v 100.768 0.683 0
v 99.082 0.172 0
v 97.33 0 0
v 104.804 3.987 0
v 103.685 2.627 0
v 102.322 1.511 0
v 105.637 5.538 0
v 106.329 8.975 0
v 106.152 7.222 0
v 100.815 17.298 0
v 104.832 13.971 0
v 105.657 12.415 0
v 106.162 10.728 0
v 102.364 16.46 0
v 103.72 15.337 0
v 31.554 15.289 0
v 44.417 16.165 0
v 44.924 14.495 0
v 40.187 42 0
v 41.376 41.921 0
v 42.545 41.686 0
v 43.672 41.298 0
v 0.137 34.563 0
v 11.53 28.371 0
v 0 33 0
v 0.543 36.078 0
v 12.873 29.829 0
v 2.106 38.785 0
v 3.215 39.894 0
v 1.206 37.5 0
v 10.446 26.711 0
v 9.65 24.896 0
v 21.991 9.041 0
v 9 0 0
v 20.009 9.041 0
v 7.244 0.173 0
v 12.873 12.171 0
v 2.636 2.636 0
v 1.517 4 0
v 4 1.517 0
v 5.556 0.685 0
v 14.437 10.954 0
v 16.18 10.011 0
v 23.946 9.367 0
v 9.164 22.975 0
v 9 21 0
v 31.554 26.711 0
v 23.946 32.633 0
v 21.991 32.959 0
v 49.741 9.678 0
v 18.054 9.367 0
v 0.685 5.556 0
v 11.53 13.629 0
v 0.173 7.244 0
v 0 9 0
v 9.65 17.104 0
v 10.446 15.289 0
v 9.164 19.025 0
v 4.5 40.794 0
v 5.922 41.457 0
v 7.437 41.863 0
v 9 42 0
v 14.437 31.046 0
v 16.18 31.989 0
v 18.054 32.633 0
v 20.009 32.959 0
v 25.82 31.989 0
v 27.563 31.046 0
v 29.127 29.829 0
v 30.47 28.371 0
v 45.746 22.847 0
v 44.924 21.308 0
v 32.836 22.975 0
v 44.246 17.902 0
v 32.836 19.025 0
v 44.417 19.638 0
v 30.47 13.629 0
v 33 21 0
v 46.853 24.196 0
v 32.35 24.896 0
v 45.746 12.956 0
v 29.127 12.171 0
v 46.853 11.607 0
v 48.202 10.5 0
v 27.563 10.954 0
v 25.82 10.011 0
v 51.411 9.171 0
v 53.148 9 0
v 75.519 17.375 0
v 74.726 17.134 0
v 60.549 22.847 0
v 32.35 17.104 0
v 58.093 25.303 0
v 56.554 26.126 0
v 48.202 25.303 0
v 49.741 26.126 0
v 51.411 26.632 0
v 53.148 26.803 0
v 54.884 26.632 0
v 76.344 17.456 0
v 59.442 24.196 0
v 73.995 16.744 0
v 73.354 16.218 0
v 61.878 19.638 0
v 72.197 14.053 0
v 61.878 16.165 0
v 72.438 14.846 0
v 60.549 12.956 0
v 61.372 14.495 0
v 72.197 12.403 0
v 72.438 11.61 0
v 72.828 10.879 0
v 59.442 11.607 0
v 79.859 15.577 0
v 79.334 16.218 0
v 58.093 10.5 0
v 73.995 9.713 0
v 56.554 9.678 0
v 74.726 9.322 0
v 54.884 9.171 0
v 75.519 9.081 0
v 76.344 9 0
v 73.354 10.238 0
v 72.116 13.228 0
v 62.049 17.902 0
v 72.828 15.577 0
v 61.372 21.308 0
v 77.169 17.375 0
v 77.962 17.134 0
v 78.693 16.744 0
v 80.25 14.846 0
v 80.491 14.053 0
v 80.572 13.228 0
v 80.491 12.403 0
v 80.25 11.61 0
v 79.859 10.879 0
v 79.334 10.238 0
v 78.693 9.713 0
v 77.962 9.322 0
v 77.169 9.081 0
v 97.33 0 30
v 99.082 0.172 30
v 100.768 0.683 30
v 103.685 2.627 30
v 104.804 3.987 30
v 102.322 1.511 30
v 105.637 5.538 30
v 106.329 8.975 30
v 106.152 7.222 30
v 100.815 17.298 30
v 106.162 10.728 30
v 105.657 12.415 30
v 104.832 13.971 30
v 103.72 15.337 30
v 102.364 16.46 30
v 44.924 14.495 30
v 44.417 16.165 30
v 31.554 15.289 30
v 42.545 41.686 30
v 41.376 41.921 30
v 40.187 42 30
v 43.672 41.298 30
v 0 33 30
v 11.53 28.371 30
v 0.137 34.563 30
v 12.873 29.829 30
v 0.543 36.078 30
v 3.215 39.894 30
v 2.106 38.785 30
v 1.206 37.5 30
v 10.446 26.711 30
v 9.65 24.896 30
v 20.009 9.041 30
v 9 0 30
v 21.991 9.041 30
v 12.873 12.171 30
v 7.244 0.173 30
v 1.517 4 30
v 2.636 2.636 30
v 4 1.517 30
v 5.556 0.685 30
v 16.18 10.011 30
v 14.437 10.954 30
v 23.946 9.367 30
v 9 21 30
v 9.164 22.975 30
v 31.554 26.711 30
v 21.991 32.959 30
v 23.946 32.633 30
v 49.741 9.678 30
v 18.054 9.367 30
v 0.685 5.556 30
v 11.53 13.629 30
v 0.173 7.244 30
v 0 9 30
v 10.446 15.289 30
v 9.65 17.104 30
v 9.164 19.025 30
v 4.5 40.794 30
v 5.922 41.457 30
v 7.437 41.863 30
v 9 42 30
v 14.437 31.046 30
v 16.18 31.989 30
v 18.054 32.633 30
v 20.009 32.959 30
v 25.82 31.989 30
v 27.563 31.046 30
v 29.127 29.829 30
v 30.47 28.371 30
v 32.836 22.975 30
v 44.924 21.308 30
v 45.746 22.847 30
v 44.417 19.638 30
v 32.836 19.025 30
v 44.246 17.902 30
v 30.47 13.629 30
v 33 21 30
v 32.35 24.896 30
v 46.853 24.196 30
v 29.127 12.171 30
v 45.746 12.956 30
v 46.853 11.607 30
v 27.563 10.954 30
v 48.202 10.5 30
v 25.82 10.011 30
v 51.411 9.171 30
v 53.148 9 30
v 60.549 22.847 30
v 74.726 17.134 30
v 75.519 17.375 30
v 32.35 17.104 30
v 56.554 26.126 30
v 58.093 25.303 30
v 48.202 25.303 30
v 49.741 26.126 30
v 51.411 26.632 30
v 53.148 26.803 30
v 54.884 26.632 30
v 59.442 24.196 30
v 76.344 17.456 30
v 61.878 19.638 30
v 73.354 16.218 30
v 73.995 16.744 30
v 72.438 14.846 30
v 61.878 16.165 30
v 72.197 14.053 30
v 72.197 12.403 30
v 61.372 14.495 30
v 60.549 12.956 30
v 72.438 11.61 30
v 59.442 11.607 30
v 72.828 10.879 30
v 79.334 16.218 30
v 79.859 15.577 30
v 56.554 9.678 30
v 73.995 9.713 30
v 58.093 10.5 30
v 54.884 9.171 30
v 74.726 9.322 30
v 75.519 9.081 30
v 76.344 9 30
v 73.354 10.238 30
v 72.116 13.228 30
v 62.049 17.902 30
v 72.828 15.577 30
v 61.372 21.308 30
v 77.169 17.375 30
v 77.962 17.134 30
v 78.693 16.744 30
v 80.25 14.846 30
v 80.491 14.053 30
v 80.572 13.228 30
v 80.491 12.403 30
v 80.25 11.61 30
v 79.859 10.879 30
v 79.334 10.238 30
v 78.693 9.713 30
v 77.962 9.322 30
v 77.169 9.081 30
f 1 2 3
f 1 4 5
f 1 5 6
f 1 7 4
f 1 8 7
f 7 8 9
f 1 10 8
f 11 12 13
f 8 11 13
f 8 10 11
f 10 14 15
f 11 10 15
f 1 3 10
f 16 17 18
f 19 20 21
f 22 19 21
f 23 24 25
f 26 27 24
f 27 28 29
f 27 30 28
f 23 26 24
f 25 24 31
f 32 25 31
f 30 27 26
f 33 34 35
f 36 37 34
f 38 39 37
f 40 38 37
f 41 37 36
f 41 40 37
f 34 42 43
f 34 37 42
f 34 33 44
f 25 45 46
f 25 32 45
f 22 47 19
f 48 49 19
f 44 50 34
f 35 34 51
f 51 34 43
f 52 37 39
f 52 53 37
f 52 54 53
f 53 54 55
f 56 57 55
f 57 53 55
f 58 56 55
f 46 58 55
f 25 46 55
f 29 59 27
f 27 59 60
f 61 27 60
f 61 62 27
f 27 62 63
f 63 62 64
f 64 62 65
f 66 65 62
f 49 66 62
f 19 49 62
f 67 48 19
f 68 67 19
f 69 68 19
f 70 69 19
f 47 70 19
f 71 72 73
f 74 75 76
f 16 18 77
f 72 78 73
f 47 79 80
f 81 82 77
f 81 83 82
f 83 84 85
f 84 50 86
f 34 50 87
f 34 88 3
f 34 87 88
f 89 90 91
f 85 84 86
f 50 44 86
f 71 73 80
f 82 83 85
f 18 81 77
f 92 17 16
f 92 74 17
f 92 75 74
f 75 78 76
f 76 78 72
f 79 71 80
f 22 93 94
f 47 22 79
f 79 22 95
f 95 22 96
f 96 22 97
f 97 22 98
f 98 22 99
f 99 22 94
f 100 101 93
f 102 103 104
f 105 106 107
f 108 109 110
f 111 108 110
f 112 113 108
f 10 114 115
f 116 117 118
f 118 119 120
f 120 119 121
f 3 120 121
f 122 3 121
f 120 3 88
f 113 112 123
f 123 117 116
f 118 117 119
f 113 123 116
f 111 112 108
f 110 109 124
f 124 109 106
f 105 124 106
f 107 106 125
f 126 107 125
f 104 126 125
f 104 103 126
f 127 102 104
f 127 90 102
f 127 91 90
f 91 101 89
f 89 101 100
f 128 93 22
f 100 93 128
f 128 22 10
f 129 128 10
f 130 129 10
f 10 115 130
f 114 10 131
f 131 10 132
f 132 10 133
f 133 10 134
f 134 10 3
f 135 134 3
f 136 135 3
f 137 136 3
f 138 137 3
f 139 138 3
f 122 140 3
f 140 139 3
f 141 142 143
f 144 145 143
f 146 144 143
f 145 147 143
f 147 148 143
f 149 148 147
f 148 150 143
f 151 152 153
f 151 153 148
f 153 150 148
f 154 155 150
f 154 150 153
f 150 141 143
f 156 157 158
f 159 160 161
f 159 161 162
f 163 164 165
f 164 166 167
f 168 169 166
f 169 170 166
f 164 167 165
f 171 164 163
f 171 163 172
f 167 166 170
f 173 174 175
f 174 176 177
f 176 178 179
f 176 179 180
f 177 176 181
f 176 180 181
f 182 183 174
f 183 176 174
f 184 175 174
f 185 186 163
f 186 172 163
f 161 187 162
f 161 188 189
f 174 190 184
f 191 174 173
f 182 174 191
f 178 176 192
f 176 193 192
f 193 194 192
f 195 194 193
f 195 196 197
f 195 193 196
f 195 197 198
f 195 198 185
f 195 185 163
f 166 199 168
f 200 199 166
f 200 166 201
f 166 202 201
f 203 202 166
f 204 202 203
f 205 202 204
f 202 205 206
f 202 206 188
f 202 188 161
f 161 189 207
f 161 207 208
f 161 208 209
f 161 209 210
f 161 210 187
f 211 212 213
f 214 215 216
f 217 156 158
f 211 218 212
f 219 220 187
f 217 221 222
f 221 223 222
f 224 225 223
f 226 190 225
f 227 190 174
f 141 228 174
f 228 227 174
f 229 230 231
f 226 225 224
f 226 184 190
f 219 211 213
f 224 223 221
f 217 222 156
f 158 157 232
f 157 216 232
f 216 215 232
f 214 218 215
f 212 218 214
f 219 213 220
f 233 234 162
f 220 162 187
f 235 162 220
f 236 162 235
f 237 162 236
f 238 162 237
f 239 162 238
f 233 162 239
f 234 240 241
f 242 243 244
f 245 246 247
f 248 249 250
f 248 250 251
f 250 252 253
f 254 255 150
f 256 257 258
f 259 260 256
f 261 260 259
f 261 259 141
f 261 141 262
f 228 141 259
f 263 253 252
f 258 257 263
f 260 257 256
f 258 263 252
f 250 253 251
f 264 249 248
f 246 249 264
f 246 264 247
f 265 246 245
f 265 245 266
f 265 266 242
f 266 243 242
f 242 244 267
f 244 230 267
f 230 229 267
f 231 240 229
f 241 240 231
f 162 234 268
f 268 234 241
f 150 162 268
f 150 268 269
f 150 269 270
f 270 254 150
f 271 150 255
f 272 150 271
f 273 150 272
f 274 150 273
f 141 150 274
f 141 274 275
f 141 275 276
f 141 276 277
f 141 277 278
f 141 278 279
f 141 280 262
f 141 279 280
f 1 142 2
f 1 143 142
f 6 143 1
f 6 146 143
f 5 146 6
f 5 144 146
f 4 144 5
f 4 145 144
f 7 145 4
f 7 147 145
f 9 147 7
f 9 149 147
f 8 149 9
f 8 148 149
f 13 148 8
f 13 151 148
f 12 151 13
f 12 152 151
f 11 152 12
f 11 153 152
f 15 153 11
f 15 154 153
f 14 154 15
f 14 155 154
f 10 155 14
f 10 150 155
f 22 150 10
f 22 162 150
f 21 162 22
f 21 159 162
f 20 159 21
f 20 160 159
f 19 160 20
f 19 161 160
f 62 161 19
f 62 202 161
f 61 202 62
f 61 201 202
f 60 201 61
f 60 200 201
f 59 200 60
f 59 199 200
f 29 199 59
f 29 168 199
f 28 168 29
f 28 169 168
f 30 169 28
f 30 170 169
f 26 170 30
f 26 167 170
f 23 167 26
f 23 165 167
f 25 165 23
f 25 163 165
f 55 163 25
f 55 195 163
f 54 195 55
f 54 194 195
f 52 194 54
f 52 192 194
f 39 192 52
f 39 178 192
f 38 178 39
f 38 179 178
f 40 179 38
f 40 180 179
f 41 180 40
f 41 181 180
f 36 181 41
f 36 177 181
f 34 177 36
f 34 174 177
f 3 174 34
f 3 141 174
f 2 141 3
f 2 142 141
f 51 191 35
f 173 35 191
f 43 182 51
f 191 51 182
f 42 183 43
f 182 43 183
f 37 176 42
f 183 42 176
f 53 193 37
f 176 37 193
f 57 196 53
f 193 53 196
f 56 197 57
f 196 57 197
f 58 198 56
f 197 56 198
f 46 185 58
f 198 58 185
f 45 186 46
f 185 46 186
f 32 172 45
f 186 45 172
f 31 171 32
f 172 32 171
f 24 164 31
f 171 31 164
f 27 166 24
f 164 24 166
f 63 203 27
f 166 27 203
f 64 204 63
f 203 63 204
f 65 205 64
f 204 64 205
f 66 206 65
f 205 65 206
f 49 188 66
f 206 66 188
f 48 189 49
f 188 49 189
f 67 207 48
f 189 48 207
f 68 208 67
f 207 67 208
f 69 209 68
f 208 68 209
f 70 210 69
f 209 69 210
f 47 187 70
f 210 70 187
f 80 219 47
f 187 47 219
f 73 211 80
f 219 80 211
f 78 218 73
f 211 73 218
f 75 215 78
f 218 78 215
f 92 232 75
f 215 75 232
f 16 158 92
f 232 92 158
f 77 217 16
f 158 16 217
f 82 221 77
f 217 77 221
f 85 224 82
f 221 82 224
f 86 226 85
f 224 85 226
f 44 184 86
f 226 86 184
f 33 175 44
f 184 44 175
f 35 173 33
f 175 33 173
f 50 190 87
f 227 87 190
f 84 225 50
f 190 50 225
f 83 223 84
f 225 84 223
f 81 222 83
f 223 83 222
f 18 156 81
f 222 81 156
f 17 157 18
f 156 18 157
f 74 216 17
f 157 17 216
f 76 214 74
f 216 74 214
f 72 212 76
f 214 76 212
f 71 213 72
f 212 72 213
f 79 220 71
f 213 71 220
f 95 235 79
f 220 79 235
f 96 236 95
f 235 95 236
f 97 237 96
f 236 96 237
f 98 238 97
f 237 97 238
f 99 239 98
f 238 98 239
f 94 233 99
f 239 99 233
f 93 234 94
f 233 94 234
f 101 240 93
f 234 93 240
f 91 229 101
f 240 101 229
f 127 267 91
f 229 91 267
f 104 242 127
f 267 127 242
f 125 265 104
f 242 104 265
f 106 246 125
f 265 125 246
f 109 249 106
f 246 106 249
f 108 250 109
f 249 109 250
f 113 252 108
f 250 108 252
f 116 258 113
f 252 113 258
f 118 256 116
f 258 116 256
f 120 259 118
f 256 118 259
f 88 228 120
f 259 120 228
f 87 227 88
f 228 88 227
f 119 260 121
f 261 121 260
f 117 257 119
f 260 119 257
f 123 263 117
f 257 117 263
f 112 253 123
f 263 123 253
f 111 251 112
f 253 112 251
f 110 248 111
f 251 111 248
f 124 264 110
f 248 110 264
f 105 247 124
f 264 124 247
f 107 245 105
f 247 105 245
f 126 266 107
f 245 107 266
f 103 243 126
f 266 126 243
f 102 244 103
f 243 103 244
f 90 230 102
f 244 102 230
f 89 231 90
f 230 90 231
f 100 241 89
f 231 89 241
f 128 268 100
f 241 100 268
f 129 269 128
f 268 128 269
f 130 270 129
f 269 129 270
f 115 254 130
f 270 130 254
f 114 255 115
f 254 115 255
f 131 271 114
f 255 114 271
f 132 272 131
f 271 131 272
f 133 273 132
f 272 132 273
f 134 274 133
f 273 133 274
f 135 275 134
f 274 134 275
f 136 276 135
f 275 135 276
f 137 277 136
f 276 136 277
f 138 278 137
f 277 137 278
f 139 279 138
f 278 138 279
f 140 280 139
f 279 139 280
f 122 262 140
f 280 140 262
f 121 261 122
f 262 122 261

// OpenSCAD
// Generated by Parametrix
ca_doorstop_faceProfile_000 = [ [ 9.0000, 0.0000 ],[ 97.3296, 0.0000 ],[ 99.0823, 0.1723 ],[ 100.7679, 0.6827 ],[ 102.3218, 1.5115 ],[ 103.6846, 2.6271 ],[ 104.8040, 3.9867 ],[ 105.6372, 5.5383 ],[ 106.1523, 7.2224 ],[ 106.3295, 8.9747 ],[ 106.1622, 10.7278 ],[ 105.6566, 12.4149 ],[ 104.8321, 13.9711 ],[ 103.7204, 15.3370 ],[ 102.3639, 16.4603 ],[ 100.8147, 17.2978 ],[ 43.6718, 41.2978 ],[ 42.5446, 41.6856 ],[ 41.3761, 41.9211 ],[ 40.1867, 42.0000 ],[ 9.0000, 42.0000 ],[ 7.4372, 41.8633 ],[ 5.9218, 41.4572 ],[ 4.5000, 40.7942 ],[ 3.2149, 39.8944 ],[ 2.1056, 38.7851 ],[ 1.2058, 37.5000 ],[ 0.5428, 36.0782 ],[ 0.1367, 34.5628 ],[ 0.0000, 33.0000 ],[ 0.0000, 9.0000 ],[ 0.1729, 7.2442 ],[ 0.6851, 5.5558 ],[ 1.5168, 3.9999 ],[ 2.6360, 2.6360 ],[ 3.9999, 1.5168 ],[ 5.5558, 0.6851 ],[ 7.2442, 0.1729 ],[ 9.0000, 0.0000 ] ];
cb_doorstop_faceProfile_000 = [  0, 1, 2, 3, 4, 5, 6, 7, 8, 9, 10, 11, 12, 13, 14, 15, 16, 17, 18, 19, 20, 21, 22, 23, 24, 25, 26, 27, 28, 29, 30, 31, 32, 33, 34, 35, 36, 37, 38 ];
ca_doorstop_faceProfile_001 = [ [ 33.0000, 21.0000 ],[ 32.8363, 22.9751 ],[ 32.3498, 24.8964 ],[ 31.5537, 26.7114 ],[ 30.4697, 28.3706 ],[ 29.1274, 29.8287 ],[ 27.5634, 31.0460 ],[ 25.8203, 31.9893 ],[ 23.9458, 32.6328 ],[ 21.9910, 32.9590 ],[ 20.0090, 32.9590 ],[ 18.0542, 32.6328 ],[ 16.1797, 31.9893 ],[ 14.4366, 31.0460 ],[ 12.8726, 29.8287 ],[ 11.5303, 28.3706 ],[ 10.4463, 26.7114 ],[ 9.6502, 24.8964 ],[ 9.1637, 22.9751 ],[ 9.0000, 21.0000 ],[ 9.1637, 19.0249 ],[ 9.6502, 17.1036 ],[ 10.4463, 15.2886 ],[ 11.5303, 13.6294 ],[ 12.8726, 12.1713 ],[ 14.4366, 10.9540 ],[ 16.1797, 10.0107 ],[ 18.0542, 9.3672 ],[ 20.0090, 9.0410 ],[ 21.9910, 9.0410 ],[ 23.9458, 9.3672 ],[ 25.8203, 10.0107 ],[ 27.5634, 10.9540 ],[ 29.1274, 12.1713 ],[ 30.4697, 13.6294 ],[ 31.5537, 15.2886 ],[ 32.3498, 17.1036 ],[ 32.8363, 19.0249 ],[ 33.0000, 21.0000 ] ];
cb_doorstop_faceProfile_001 = [  39, 40, 41, 42, 43, 44, 45, 46, 47, 48, 49, 50, 51, 52, 53, 54, 55, 56, 57, 58, 59, 60, 61, 62, 63, 64, 65, 66, 67, 68, 69, 70, 71, 72, 73, 74, 75, 76, 77 ];
ca_doorstop_faceProfile_002 = [ [ 62.0492, 17.9016 ],[ 61.8781, 19.6382 ],[ 61.3716, 21.3081 ],[ 60.5490, 22.8471 ],[ 59.4419, 24.1960 ],[ 58.0930, 25.3030 ],[ 56.5541, 26.1256 ],[ 54.8842, 26.6322 ],[ 53.1476, 26.8032 ],[ 51.4109, 26.6322 ],[ 49.7411, 26.1256 ],[ 48.2021, 25.3030 ],[ 46.8532, 24.1960 ],[ 45.7462, 22.8471 ],[ 44.9236, 21.3081 ],[ 44.4170, 19.6382 ],[ 44.2460, 17.9016 ],[ 44.4170, 16.1650 ],[ 44.9236, 14.4951 ],[ 45.7462, 12.9561 ],[ 46.8532, 11.6072 ],[ 48.2021, 10.5002 ],[ 49.7411, 9.6776 ],[ 51.4109, 9.1710 ],[ 53.1476, 9.0000 ],[ 54.8842, 9.1710 ],[ 56.5541, 9.6776 ],[ 58.0930, 10.5002 ],[ 59.4419, 11.6072 ],[ 60.5490, 12.9561 ],[ 61.3716, 14.4951 ],[ 61.8781, 16.1650 ],[ 62.0492, 17.9016 ] ];
cb_doorstop_faceProfile_002 = [  78, 79, 80, 81, 82, 83, 84, 85, 86, 87, 88, 89, 90, 91, 92, 93, 94, 95, 96, 97, 98, 99, 100, 101, 102, 103, 104, 105, 106, 107, 108, 109, 110 ];
ca_doorstop_faceProfile_003 = [ [ 80.5721, 13.2281 ],[ 80.4909, 14.0529 ],[ 80.2503, 14.8461 ],[ 79.8595, 15.5771 ],[ 79.3337, 16.2178 ],[ 78.6930, 16.7436 ],[ 77.9620, 17.1343 ],[ 77.1689, 17.3749 ],[ 76.3440, 17.4562 ],[ 75.5192, 17.3749 ],[ 74.7260, 17.1343 ],[ 73.9950, 16.7436 ],[ 73.3543, 16.2178 ],[ 72.8285, 15.5771 ],[ 72.4378, 14.8461 ],[ 72.1972, 14.0529 ],[ 72.1159, 13.2281 ],[ 72.1972, 12.4032 ],[ 72.4378, 11.6101 ],[ 72.8285, 10.8791 ],[ 73.3543, 10.2384 ],[ 73.9950, 9.7126 ],[ 74.7260, 9.3218 ],[ 75.5192, 9.0812 ],[ 76.3440, 9.0000 ],[ 77.1689, 9.0812 ],[ 77.9620, 9.3218 ],[ 78.6930, 9.7126 ],[ 79.3337, 10.2384 ],[ 79.8595, 10.8791 ],[ 80.2503, 11.6101 ],[ 80.4909, 12.4032 ],[ 80.5721, 13.2281 ] ];
cb_doorstop_faceProfile_003 = [  111, 112, 113, 114, 115, 116, 117, 118, 119, 120, 121, 122, 123, 124, 125, 126, 127, 128, 129, 130, 131, 132, 133, 134, 135, 136, 137, 138, 139, 140, 141, 142, 143 ];
a_doorstop_faceProfile = concat(ca_doorstop_faceProfile_000, ca_doorstop_faceProfile_001, ca_doorstop_faceProfile_002, ca_doorstop_faceProfile_003);
b_doorstop_faceProfile = [cb_doorstop_faceProfile_000, cb_doorstop_faceProfile_001, cb_doorstop_faceProfile_002, cb_doorstop_faceProfile_003];
ca_doorstop_faceTop_000 = [ [ 0.0000, 0.0000 ],[ 42.0000, 0.0000 ],[ 42.0000, 30.0000 ],[ 0.0000, 30.0000 ],[ 0.0000, 0.0000 ] ];
cb_doorstop_faceTop_000 = [  0, 1, 2, 3, 4 ];
ca_doorstop_faceTop_001 = [ [ 42.0000, 0.0000 ],[ 142.0000, 0.0000 ],[ 142.0000, 30.0000 ],[ 42.0000, 30.0000 ],[ 42.0000, 0.0000 ] ];
cb_doorstop_faceTop_001 = [  5, 6, 7, 8, 9 ];
a_doorstop_faceTop = concat(ca_doorstop_faceTop_000, ca_doorstop_faceTop_001);
b_doorstop_faceTop = [cb_doorstop_faceTop_000, cb_doorstop_faceTop_001];
ca_doorstop_faceSide_000 = [ [ 0.0000, 0.0000 ],[ 30.0000, 0.0000 ],[ 30.0000, 42.0000 ],[ 0.0000, 42.0000 ],[ 0.0000, 0.0000 ] ];
cb_doorstop_faceSide_000 = [  0, 1, 2, 3, 4 ];
a_doorstop_faceSide = concat(ca_doorstop_faceSide_000);
b_doorstop_faceSide = [cb_doorstop_faceSide_000];

module subpax_doorstop () {
	translate( [ 0, 0, 0 ])
		rotate( [ 0, 0, 0 ])
			   linear_extrude(height = 30) polygon(a_doorstop_faceProfile, b_doorstop_faceProfile);
}

module pax_doorstop () {
	subpax_doorstop();
}

pax_doorstop();
